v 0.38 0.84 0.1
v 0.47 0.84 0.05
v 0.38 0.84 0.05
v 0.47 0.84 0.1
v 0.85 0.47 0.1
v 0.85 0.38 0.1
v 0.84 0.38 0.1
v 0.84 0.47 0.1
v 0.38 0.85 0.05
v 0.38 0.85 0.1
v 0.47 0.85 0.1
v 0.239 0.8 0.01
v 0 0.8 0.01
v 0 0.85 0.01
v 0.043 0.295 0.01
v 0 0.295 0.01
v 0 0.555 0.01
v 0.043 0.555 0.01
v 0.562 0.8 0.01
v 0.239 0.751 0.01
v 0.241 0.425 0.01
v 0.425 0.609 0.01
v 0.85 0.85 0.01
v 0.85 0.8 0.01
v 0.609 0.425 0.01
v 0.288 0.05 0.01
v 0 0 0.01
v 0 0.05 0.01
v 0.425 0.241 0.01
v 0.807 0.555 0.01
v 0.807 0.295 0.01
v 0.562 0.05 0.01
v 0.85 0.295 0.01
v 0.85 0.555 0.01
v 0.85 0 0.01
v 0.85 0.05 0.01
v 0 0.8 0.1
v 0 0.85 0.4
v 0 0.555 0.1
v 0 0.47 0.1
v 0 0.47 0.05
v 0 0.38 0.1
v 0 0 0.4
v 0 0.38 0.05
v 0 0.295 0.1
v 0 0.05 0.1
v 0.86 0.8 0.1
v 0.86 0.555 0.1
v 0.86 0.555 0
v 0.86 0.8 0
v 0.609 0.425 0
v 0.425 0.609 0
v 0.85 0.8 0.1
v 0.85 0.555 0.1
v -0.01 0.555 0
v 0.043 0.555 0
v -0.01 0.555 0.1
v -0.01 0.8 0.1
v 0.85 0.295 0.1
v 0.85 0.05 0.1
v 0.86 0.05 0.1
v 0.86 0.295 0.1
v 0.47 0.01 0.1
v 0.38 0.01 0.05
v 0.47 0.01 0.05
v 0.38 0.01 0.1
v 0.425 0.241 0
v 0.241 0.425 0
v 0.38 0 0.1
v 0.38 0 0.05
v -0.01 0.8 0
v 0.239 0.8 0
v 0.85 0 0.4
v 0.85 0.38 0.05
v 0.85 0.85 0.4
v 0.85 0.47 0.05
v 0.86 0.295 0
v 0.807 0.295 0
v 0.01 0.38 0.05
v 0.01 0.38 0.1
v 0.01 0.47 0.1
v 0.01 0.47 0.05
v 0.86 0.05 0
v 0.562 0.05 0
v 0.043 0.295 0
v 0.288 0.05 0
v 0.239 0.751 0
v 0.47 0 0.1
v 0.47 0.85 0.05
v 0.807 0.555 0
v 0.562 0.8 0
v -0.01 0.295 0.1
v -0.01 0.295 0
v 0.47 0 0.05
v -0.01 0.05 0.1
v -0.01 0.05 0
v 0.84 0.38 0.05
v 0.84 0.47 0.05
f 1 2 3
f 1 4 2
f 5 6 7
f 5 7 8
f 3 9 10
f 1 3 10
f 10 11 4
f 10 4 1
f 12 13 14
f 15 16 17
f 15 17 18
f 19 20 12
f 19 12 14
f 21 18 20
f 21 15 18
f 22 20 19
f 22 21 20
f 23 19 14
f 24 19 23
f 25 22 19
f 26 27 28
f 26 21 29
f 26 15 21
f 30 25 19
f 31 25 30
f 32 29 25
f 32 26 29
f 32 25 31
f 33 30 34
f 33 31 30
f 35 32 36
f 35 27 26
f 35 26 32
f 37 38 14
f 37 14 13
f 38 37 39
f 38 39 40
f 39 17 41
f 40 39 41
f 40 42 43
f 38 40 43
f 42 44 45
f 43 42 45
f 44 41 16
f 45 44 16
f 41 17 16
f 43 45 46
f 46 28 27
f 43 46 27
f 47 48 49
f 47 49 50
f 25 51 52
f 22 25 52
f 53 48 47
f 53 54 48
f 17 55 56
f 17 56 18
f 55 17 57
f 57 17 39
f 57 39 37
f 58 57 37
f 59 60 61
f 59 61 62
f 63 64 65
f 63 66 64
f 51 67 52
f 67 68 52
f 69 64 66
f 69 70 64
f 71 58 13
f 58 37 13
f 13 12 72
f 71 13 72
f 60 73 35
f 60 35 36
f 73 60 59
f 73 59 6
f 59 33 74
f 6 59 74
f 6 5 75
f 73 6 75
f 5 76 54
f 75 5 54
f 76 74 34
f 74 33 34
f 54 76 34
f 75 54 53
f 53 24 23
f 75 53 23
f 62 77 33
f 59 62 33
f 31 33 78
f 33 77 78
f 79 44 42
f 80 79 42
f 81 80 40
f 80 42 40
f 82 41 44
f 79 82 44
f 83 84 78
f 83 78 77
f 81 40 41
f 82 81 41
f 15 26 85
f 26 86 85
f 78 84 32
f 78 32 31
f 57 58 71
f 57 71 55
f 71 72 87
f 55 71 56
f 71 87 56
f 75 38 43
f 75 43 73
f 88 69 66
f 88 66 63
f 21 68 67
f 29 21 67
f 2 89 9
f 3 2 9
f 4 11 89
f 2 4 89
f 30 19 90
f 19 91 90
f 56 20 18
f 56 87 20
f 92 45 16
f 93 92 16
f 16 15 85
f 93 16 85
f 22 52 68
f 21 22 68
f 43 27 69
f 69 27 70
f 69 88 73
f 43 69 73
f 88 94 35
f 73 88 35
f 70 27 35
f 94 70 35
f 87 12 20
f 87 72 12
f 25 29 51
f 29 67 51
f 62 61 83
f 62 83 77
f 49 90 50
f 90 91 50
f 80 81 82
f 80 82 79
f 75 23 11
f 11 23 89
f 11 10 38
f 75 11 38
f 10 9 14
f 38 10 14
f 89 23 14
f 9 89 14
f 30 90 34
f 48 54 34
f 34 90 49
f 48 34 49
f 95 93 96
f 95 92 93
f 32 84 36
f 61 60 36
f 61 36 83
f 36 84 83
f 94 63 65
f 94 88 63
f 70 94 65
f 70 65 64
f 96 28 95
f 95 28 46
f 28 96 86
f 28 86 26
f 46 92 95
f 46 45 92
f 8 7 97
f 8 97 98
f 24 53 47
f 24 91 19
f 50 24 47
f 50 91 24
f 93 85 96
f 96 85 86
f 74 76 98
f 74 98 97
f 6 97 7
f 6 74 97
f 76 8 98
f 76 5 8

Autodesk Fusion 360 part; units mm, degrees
sketch "Sketch1" plane through (0, 0, 0) normal (0, 0, 1) x (1, 0, 0)
  line L0 (0, 0) -> (0.85, 0)
  line L1 (0.85, 0) -> (0.85, 0.85)
  line L2 (0.85, 0.85) -> (0, 0.85)
  line L3 (0, 0.85) -> (0, 0)
  dimension "d1" = 0.85
  dimension "d2" = 0.85
extrude "Extrude1" add sketch "Sketch1" along normal blind 0.4
sketch "Sketch2" plane through (0, 0, 0) normal (0, 0, -1) x (1, 0, 0)
  line L0 (0, 0) -> (0, -0.85)
  line L1 (0, -0.85) -> (0.85, -0.85)
  line L2 (0.85, -0.85) -> (0.85, 0)
  line L3 (0.85, 0) -> (0, 0)
  line L4 (0.425, -0.85) -> (0.85, -0.85)
  line L5 (0.425, -0.85) -> (0.425, 0)
  line L6 (0.425, -0.425) -> (0.85, -0.425)
  line L7 (0.425, -0.425) -> (0, -0.425)
  line L8 (0.425, -0.425) -> (0.425, -0.241)
  line L9 (0.425, -0.425) -> (0.425, -0.609)
  line L10 (0.425, -0.425) -> (0.609, -0.425)
  line L11 (0.425, -0.425) -> (0.241, -0.425)
  line L12 (0.241, -0.425) -> (0.425, -0.241)
  line L13 (0.425, -0.241) -> (0.609, -0.425)
  line L14 (0.609, -0.425) -> (0.425, -0.609)
  line L15 (0.425, -0.609) -> (0.241, -0.425)
  line L16 (0, -0.425) -> (0, -0.555)
  line L17 (0, -0.425) -> (0, -0.295)
  line L18 (0.85, -0.425) -> (0.85, -0.295)
  line L19 (0.85, -0.425) -> (0.85, -0.555)
  line L20 (0.425, -0.85) -> (0.425, -0.75)
  line L21 (0.85, -0.425) -> (0.75, -0.425)
  line L22 (0.425, -0.75) -> (0.75, -0.425)
  line L23 (0.425, 0) -> (0.425, -0.1)
  line L24 (0.425, -0.1) -> (0.75, -0.425)
  line L25 (0, -0.425) -> (0.1, -0.425)
  line L26 (0.1, -0.425) -> (0.425, -0.1)
  line L27 (0.1, -0.425) -> (0.425, -0.75)
  line L28 (0, -0.555) -> (0.85, -0.555)
  line L29 (0.85, -0.295) -> (0, -0.295)
  line L30 (0, -0.85) -> (0, -0.8)
  line L31 (0, -0.8) -> (0.85, -0.8)
  line L32 (0.85, 0) -> (0.85, -0.05)
  line L33 (0, -0.05) -> (0.85, -0.05)
  line L34 (0.85, -0.05) -> (0, -0.05)
  line L35 (0.85, -0.8) -> (0.562, -0.8)
  line L36 (0, -0.8) -> (0.288, -0.8)
  line L37 (0, -0.05) -> (0.288, -0.05)
  line L38 (0.85, -0.05) -> (0.562, -0.05)
  line L39 (0.562, -0.8) -> (0.85, -0.512)
  line L40 (0.562, -0.8) -> (0.9693, -0.8) construction
  line L41 (0.288, -0.8) -> (0, -0.512)
  line L42 (0.562, -0.05) -> (0.85, -0.338)
  line L43 (0.288, -0.05) -> (0, -0.338)
  line L44 (0, -0.8) -> (0.239, -0.8)
  line L45 (0.239, -0.8) -> (0.239, -0.751)
  dimension "d7" = 0.184
  dimension "d8" = 0.184
  dimension "d9" = 0.184
  dimension "d10" = 0.184
  dimension "d11" = 0.13
  dimension "d12" = 0.13
  dimension "d13" = 0.13
  dimension "d14" = 0.13
  dimension "d15" = 0.288
  dimension "d16" = 0.288
  dimension "d17" = 0.288
  dimension "d18" = 0.288
  dimension "d19" = 45
  dimension "d20" = 90
  dimension "d21" = 90
  dimension "d22" = 0.239
extrude "Extrude2" cut sketch "Sketch2" against normal blind 0.01 contours L0 L3 L5 L23 L33 L34 L37 | L2 L3 L5 L23 L32 L33 L34 L38 | L0 L17 L29 L43 | L5 L23 L26 L29 L33 L34 L43 | L5 L23 L24 L29 L33 L34 L42 | L0 L7 L17 L25 L26 L29 L43 | L5 L13 L24 L29 | L5 L12 L26 L29 | L0 L7 L16 L25 L27 L28 L41 | L7 L12 L26 L29 | L2 L18 L29 L42 | L2 L6 L18 L21 L24 L29 L42 | L6 L13 L24 L29 | L0 L16 L28 L41 | L7 L15 L27 L28 | L6 L14 L22 L28 | L2 L6 L19 L21 L22 L28 L39 | L5 L20 L27 L28 L31 L41 | L5 L15 L27 L28 | L5 L20 L22 L28 L31 L39 | L5 L14 L22 L28 | L0 L1 L5 L20 L30 L31 L36 L44 | L31 L36 L41 L45 | L2 L19 L28 L39 | L1 L2 L4 L5 L20 L31 L35
sketch "Sketch3" plane through (0, 0, 0) normal (-1, 0, 0) x (0, -1, 0)
  line L0 (-0.05, 0.01) -> (0, 0.01)
  line L1 (0, 0.01) -> (0, 0.4)
  line L2 (0, 0.4) -> (-0.85, 0.4)
  line L3 (-0.85, 0.4) -> (-0.85, 0.01)
  line L4 (-0.85, 0.01) -> (-0.8, 0.01)
  line L5 (-0.8, 0.01) -> (-0.8, 0)
  line L6 (-0.8, 0) -> (-0.555, 0)
  line L7 (-0.555, 0) -> (-0.555, 0.01)
  line L8 (-0.555, 0.01) -> (-0.295, 0.01)
  line L9 (-0.295, 0.01) -> (-0.295, 0)
  line L10 (-0.295, 0) -> (-0.05, 0)
  line L11 (-0.05, 0) -> (-0.05, 0.01)
  line L12 (-0.8, 0.01) -> (-0.8, 0.1)
  line L13 (-0.555, 0.01) -> (-0.555, 0.1)
  line L14 (-0.555, 0.1) -> (-0.8, 0.1)
  line L15 (-0.295, 0.01) -> (-0.295, 0.1)
  line L16 (-0.295, 0.1) -> (-0.05, 0.1)
  line L17 (-0.05, 0.1) -> (-0.05, 0.01)
  line L18 (-0.555, 0.1) -> (-0.47, 0.1)
  line L19 (-0.295, 0.1) -> (-0.38, 0.1)
  line L20 (-0.38, 0.1) -> (-0.47, 0.1)
  line L21 (-0.47, 0.1) -> (-0.47, 0.05)
  line L22 (-0.47, 0.05) -> (-0.38, 0.05)
  line L23 (-0.38, 0.05) -> (-0.38, 0.1)
  line L24 (-0.05, 0.1) -> (0, 0.1)
  line L25 (-0.8, 0.1) -> (-0.85, 0.1)
  dimension "d25" = 0.09
sketch "Sketch4" plane through (0, 0.85, 0) normal (0, 1, 0) x (-1, 0, 0)
  line L0 (-0.85, 0.01) -> (0, 0.01)
  line L1 (0, 0.01) -> (0, 0.4)
  line L2 (0, 0.4) -> (-0.85, 0.4)
  line L3 (-0.85, 0.4) -> (-0.85, 0.01)
  line L4 (0, 0.1) -> (-0.85, 0.1)
  line L5 (-0.425, 0.1) -> (-0.38, 0.1)
  line L6 (-0.425, 0.1) -> (-0.47, 0.1)
  line L7 (-0.47, 0.1) -> (-0.47, 0.05)
  line L8 (-0.47, 0.05) -> (-0.38, 0.05)
  line L9 (-0.38, 0.05) -> (-0.38, 0.1)
sketch "Sketch5" plane through (0, 0, 0) normal (0, -1, 0) x (1, 0, 0)
  line L0 (0, 0.01) -> (0.85, 0.01)
  line L1 (0.85, 0.01) -> (0.85, 0.4)
  line L2 (0.85, 0.4) -> (0, 0.4)
  line L3 (0, 0.4) -> (0, 0.01)
  line L4 (0, 0.1) -> (0.85, 0.1)
  line L5 (0.425, 0.1) -> (0.47, 0.1)
  line L6 (0.47, 0.1) -> (0.47, 0.05)
  line L7 (0.47, 0.05) -> (0.38, 0.05)
  line L8 (0.38, 0.05) -> (0.38, 0.1)
sketch "Sketch6" plane through (0.85, 0, 0) normal (1, 0, 0) x (0, 1, 0)
  line L0 (0, 0.01) -> (0.05, 0.01)
  line L1 (0.05, 0.01) -> (0.05, 0)
  line L2 (0.05, 0) -> (0.295, 0)
  line L3 (0.295, 0) -> (0.295, 0.01)
  line L4 (0.295, 0.01) -> (0.555, 0.01)
  line L5 (0.555, 0.01) -> (0.555, 0)
  line L6 (0.555, 0) -> (0.8, 0)
  line L7 (0.8, 0) -> (0.8, 0.01)
  line L8 (0.8, 0.01) -> (0.85, 0.01)
  line L9 (0.85, 0.01) -> (0.85, 0.4)
  line L10 (0.85, 0.4) -> (0, 0.4)
  line L11 (0, 0.4) -> (0, 0.01)
  line L12 (0, 0.1) -> (0.85, 0.1)
  line L13 (0.425, 0.1) -> (0.47, 0.1)
  line L14 (0.47, 0.1) -> (0.47, 0.05)
  line L15 (0.47, 0.05) -> (0.38, 0.05)
  line L16 (0.38, 0.05) -> (0.38, 0.1)
  line L17 (0.555, 0.01) -> (0.555, 0.1)
  line L18 (0.8, 0.01) -> (0.8, 0.1)
  line L19 (0.295, 0.01) -> (0.295, 0.1)
  line L20 (0.05, 0.01) -> (0.05, 0.1)
extrude "Extrude3" add sketch "Sketch4" along normal blind 0.01 contours L4 L5 L6 L7 L8 L9
extrude "Extrude4" add sketch "Sketch6" along normal blind 0.01 contours L1 L2 L3 L12 L19 L20 | L12 L13 L14 L15 L16 | L5 L6 L7 L12 L17 L18
extrude "Extrude5" add sketch "Sketch3" along normal blind 0.01 contours L9 L10 L11 L15 L16 L17 | L20 L21 L22 L23 | L5 L6 L7 L12 L13 L14
extrude "Extrude6" add sketch "Sketch5" along normal blind 0.01 contours L4 L5 L6 L7 L8
extrude "Extrude7" cut 1 faces at (0.86, 0.41, 0.0833) along direction (-1, 0, 0) blind 0.02
extrude "Extrude8" cut 1 faces at (0.41, -0.01, 0.0833) along direction (0, 1, 0) blind 0.02
extrude "Extrude9" cut 1 faces at (0.44, 0.86, 0.0833) along direction (0, -1, 0) blind 0.02
extrude "Extrude10" cut 1 faces at (-0.01, 0.44, 0.0833) along direction (1, 0, 0) blind 0.02
